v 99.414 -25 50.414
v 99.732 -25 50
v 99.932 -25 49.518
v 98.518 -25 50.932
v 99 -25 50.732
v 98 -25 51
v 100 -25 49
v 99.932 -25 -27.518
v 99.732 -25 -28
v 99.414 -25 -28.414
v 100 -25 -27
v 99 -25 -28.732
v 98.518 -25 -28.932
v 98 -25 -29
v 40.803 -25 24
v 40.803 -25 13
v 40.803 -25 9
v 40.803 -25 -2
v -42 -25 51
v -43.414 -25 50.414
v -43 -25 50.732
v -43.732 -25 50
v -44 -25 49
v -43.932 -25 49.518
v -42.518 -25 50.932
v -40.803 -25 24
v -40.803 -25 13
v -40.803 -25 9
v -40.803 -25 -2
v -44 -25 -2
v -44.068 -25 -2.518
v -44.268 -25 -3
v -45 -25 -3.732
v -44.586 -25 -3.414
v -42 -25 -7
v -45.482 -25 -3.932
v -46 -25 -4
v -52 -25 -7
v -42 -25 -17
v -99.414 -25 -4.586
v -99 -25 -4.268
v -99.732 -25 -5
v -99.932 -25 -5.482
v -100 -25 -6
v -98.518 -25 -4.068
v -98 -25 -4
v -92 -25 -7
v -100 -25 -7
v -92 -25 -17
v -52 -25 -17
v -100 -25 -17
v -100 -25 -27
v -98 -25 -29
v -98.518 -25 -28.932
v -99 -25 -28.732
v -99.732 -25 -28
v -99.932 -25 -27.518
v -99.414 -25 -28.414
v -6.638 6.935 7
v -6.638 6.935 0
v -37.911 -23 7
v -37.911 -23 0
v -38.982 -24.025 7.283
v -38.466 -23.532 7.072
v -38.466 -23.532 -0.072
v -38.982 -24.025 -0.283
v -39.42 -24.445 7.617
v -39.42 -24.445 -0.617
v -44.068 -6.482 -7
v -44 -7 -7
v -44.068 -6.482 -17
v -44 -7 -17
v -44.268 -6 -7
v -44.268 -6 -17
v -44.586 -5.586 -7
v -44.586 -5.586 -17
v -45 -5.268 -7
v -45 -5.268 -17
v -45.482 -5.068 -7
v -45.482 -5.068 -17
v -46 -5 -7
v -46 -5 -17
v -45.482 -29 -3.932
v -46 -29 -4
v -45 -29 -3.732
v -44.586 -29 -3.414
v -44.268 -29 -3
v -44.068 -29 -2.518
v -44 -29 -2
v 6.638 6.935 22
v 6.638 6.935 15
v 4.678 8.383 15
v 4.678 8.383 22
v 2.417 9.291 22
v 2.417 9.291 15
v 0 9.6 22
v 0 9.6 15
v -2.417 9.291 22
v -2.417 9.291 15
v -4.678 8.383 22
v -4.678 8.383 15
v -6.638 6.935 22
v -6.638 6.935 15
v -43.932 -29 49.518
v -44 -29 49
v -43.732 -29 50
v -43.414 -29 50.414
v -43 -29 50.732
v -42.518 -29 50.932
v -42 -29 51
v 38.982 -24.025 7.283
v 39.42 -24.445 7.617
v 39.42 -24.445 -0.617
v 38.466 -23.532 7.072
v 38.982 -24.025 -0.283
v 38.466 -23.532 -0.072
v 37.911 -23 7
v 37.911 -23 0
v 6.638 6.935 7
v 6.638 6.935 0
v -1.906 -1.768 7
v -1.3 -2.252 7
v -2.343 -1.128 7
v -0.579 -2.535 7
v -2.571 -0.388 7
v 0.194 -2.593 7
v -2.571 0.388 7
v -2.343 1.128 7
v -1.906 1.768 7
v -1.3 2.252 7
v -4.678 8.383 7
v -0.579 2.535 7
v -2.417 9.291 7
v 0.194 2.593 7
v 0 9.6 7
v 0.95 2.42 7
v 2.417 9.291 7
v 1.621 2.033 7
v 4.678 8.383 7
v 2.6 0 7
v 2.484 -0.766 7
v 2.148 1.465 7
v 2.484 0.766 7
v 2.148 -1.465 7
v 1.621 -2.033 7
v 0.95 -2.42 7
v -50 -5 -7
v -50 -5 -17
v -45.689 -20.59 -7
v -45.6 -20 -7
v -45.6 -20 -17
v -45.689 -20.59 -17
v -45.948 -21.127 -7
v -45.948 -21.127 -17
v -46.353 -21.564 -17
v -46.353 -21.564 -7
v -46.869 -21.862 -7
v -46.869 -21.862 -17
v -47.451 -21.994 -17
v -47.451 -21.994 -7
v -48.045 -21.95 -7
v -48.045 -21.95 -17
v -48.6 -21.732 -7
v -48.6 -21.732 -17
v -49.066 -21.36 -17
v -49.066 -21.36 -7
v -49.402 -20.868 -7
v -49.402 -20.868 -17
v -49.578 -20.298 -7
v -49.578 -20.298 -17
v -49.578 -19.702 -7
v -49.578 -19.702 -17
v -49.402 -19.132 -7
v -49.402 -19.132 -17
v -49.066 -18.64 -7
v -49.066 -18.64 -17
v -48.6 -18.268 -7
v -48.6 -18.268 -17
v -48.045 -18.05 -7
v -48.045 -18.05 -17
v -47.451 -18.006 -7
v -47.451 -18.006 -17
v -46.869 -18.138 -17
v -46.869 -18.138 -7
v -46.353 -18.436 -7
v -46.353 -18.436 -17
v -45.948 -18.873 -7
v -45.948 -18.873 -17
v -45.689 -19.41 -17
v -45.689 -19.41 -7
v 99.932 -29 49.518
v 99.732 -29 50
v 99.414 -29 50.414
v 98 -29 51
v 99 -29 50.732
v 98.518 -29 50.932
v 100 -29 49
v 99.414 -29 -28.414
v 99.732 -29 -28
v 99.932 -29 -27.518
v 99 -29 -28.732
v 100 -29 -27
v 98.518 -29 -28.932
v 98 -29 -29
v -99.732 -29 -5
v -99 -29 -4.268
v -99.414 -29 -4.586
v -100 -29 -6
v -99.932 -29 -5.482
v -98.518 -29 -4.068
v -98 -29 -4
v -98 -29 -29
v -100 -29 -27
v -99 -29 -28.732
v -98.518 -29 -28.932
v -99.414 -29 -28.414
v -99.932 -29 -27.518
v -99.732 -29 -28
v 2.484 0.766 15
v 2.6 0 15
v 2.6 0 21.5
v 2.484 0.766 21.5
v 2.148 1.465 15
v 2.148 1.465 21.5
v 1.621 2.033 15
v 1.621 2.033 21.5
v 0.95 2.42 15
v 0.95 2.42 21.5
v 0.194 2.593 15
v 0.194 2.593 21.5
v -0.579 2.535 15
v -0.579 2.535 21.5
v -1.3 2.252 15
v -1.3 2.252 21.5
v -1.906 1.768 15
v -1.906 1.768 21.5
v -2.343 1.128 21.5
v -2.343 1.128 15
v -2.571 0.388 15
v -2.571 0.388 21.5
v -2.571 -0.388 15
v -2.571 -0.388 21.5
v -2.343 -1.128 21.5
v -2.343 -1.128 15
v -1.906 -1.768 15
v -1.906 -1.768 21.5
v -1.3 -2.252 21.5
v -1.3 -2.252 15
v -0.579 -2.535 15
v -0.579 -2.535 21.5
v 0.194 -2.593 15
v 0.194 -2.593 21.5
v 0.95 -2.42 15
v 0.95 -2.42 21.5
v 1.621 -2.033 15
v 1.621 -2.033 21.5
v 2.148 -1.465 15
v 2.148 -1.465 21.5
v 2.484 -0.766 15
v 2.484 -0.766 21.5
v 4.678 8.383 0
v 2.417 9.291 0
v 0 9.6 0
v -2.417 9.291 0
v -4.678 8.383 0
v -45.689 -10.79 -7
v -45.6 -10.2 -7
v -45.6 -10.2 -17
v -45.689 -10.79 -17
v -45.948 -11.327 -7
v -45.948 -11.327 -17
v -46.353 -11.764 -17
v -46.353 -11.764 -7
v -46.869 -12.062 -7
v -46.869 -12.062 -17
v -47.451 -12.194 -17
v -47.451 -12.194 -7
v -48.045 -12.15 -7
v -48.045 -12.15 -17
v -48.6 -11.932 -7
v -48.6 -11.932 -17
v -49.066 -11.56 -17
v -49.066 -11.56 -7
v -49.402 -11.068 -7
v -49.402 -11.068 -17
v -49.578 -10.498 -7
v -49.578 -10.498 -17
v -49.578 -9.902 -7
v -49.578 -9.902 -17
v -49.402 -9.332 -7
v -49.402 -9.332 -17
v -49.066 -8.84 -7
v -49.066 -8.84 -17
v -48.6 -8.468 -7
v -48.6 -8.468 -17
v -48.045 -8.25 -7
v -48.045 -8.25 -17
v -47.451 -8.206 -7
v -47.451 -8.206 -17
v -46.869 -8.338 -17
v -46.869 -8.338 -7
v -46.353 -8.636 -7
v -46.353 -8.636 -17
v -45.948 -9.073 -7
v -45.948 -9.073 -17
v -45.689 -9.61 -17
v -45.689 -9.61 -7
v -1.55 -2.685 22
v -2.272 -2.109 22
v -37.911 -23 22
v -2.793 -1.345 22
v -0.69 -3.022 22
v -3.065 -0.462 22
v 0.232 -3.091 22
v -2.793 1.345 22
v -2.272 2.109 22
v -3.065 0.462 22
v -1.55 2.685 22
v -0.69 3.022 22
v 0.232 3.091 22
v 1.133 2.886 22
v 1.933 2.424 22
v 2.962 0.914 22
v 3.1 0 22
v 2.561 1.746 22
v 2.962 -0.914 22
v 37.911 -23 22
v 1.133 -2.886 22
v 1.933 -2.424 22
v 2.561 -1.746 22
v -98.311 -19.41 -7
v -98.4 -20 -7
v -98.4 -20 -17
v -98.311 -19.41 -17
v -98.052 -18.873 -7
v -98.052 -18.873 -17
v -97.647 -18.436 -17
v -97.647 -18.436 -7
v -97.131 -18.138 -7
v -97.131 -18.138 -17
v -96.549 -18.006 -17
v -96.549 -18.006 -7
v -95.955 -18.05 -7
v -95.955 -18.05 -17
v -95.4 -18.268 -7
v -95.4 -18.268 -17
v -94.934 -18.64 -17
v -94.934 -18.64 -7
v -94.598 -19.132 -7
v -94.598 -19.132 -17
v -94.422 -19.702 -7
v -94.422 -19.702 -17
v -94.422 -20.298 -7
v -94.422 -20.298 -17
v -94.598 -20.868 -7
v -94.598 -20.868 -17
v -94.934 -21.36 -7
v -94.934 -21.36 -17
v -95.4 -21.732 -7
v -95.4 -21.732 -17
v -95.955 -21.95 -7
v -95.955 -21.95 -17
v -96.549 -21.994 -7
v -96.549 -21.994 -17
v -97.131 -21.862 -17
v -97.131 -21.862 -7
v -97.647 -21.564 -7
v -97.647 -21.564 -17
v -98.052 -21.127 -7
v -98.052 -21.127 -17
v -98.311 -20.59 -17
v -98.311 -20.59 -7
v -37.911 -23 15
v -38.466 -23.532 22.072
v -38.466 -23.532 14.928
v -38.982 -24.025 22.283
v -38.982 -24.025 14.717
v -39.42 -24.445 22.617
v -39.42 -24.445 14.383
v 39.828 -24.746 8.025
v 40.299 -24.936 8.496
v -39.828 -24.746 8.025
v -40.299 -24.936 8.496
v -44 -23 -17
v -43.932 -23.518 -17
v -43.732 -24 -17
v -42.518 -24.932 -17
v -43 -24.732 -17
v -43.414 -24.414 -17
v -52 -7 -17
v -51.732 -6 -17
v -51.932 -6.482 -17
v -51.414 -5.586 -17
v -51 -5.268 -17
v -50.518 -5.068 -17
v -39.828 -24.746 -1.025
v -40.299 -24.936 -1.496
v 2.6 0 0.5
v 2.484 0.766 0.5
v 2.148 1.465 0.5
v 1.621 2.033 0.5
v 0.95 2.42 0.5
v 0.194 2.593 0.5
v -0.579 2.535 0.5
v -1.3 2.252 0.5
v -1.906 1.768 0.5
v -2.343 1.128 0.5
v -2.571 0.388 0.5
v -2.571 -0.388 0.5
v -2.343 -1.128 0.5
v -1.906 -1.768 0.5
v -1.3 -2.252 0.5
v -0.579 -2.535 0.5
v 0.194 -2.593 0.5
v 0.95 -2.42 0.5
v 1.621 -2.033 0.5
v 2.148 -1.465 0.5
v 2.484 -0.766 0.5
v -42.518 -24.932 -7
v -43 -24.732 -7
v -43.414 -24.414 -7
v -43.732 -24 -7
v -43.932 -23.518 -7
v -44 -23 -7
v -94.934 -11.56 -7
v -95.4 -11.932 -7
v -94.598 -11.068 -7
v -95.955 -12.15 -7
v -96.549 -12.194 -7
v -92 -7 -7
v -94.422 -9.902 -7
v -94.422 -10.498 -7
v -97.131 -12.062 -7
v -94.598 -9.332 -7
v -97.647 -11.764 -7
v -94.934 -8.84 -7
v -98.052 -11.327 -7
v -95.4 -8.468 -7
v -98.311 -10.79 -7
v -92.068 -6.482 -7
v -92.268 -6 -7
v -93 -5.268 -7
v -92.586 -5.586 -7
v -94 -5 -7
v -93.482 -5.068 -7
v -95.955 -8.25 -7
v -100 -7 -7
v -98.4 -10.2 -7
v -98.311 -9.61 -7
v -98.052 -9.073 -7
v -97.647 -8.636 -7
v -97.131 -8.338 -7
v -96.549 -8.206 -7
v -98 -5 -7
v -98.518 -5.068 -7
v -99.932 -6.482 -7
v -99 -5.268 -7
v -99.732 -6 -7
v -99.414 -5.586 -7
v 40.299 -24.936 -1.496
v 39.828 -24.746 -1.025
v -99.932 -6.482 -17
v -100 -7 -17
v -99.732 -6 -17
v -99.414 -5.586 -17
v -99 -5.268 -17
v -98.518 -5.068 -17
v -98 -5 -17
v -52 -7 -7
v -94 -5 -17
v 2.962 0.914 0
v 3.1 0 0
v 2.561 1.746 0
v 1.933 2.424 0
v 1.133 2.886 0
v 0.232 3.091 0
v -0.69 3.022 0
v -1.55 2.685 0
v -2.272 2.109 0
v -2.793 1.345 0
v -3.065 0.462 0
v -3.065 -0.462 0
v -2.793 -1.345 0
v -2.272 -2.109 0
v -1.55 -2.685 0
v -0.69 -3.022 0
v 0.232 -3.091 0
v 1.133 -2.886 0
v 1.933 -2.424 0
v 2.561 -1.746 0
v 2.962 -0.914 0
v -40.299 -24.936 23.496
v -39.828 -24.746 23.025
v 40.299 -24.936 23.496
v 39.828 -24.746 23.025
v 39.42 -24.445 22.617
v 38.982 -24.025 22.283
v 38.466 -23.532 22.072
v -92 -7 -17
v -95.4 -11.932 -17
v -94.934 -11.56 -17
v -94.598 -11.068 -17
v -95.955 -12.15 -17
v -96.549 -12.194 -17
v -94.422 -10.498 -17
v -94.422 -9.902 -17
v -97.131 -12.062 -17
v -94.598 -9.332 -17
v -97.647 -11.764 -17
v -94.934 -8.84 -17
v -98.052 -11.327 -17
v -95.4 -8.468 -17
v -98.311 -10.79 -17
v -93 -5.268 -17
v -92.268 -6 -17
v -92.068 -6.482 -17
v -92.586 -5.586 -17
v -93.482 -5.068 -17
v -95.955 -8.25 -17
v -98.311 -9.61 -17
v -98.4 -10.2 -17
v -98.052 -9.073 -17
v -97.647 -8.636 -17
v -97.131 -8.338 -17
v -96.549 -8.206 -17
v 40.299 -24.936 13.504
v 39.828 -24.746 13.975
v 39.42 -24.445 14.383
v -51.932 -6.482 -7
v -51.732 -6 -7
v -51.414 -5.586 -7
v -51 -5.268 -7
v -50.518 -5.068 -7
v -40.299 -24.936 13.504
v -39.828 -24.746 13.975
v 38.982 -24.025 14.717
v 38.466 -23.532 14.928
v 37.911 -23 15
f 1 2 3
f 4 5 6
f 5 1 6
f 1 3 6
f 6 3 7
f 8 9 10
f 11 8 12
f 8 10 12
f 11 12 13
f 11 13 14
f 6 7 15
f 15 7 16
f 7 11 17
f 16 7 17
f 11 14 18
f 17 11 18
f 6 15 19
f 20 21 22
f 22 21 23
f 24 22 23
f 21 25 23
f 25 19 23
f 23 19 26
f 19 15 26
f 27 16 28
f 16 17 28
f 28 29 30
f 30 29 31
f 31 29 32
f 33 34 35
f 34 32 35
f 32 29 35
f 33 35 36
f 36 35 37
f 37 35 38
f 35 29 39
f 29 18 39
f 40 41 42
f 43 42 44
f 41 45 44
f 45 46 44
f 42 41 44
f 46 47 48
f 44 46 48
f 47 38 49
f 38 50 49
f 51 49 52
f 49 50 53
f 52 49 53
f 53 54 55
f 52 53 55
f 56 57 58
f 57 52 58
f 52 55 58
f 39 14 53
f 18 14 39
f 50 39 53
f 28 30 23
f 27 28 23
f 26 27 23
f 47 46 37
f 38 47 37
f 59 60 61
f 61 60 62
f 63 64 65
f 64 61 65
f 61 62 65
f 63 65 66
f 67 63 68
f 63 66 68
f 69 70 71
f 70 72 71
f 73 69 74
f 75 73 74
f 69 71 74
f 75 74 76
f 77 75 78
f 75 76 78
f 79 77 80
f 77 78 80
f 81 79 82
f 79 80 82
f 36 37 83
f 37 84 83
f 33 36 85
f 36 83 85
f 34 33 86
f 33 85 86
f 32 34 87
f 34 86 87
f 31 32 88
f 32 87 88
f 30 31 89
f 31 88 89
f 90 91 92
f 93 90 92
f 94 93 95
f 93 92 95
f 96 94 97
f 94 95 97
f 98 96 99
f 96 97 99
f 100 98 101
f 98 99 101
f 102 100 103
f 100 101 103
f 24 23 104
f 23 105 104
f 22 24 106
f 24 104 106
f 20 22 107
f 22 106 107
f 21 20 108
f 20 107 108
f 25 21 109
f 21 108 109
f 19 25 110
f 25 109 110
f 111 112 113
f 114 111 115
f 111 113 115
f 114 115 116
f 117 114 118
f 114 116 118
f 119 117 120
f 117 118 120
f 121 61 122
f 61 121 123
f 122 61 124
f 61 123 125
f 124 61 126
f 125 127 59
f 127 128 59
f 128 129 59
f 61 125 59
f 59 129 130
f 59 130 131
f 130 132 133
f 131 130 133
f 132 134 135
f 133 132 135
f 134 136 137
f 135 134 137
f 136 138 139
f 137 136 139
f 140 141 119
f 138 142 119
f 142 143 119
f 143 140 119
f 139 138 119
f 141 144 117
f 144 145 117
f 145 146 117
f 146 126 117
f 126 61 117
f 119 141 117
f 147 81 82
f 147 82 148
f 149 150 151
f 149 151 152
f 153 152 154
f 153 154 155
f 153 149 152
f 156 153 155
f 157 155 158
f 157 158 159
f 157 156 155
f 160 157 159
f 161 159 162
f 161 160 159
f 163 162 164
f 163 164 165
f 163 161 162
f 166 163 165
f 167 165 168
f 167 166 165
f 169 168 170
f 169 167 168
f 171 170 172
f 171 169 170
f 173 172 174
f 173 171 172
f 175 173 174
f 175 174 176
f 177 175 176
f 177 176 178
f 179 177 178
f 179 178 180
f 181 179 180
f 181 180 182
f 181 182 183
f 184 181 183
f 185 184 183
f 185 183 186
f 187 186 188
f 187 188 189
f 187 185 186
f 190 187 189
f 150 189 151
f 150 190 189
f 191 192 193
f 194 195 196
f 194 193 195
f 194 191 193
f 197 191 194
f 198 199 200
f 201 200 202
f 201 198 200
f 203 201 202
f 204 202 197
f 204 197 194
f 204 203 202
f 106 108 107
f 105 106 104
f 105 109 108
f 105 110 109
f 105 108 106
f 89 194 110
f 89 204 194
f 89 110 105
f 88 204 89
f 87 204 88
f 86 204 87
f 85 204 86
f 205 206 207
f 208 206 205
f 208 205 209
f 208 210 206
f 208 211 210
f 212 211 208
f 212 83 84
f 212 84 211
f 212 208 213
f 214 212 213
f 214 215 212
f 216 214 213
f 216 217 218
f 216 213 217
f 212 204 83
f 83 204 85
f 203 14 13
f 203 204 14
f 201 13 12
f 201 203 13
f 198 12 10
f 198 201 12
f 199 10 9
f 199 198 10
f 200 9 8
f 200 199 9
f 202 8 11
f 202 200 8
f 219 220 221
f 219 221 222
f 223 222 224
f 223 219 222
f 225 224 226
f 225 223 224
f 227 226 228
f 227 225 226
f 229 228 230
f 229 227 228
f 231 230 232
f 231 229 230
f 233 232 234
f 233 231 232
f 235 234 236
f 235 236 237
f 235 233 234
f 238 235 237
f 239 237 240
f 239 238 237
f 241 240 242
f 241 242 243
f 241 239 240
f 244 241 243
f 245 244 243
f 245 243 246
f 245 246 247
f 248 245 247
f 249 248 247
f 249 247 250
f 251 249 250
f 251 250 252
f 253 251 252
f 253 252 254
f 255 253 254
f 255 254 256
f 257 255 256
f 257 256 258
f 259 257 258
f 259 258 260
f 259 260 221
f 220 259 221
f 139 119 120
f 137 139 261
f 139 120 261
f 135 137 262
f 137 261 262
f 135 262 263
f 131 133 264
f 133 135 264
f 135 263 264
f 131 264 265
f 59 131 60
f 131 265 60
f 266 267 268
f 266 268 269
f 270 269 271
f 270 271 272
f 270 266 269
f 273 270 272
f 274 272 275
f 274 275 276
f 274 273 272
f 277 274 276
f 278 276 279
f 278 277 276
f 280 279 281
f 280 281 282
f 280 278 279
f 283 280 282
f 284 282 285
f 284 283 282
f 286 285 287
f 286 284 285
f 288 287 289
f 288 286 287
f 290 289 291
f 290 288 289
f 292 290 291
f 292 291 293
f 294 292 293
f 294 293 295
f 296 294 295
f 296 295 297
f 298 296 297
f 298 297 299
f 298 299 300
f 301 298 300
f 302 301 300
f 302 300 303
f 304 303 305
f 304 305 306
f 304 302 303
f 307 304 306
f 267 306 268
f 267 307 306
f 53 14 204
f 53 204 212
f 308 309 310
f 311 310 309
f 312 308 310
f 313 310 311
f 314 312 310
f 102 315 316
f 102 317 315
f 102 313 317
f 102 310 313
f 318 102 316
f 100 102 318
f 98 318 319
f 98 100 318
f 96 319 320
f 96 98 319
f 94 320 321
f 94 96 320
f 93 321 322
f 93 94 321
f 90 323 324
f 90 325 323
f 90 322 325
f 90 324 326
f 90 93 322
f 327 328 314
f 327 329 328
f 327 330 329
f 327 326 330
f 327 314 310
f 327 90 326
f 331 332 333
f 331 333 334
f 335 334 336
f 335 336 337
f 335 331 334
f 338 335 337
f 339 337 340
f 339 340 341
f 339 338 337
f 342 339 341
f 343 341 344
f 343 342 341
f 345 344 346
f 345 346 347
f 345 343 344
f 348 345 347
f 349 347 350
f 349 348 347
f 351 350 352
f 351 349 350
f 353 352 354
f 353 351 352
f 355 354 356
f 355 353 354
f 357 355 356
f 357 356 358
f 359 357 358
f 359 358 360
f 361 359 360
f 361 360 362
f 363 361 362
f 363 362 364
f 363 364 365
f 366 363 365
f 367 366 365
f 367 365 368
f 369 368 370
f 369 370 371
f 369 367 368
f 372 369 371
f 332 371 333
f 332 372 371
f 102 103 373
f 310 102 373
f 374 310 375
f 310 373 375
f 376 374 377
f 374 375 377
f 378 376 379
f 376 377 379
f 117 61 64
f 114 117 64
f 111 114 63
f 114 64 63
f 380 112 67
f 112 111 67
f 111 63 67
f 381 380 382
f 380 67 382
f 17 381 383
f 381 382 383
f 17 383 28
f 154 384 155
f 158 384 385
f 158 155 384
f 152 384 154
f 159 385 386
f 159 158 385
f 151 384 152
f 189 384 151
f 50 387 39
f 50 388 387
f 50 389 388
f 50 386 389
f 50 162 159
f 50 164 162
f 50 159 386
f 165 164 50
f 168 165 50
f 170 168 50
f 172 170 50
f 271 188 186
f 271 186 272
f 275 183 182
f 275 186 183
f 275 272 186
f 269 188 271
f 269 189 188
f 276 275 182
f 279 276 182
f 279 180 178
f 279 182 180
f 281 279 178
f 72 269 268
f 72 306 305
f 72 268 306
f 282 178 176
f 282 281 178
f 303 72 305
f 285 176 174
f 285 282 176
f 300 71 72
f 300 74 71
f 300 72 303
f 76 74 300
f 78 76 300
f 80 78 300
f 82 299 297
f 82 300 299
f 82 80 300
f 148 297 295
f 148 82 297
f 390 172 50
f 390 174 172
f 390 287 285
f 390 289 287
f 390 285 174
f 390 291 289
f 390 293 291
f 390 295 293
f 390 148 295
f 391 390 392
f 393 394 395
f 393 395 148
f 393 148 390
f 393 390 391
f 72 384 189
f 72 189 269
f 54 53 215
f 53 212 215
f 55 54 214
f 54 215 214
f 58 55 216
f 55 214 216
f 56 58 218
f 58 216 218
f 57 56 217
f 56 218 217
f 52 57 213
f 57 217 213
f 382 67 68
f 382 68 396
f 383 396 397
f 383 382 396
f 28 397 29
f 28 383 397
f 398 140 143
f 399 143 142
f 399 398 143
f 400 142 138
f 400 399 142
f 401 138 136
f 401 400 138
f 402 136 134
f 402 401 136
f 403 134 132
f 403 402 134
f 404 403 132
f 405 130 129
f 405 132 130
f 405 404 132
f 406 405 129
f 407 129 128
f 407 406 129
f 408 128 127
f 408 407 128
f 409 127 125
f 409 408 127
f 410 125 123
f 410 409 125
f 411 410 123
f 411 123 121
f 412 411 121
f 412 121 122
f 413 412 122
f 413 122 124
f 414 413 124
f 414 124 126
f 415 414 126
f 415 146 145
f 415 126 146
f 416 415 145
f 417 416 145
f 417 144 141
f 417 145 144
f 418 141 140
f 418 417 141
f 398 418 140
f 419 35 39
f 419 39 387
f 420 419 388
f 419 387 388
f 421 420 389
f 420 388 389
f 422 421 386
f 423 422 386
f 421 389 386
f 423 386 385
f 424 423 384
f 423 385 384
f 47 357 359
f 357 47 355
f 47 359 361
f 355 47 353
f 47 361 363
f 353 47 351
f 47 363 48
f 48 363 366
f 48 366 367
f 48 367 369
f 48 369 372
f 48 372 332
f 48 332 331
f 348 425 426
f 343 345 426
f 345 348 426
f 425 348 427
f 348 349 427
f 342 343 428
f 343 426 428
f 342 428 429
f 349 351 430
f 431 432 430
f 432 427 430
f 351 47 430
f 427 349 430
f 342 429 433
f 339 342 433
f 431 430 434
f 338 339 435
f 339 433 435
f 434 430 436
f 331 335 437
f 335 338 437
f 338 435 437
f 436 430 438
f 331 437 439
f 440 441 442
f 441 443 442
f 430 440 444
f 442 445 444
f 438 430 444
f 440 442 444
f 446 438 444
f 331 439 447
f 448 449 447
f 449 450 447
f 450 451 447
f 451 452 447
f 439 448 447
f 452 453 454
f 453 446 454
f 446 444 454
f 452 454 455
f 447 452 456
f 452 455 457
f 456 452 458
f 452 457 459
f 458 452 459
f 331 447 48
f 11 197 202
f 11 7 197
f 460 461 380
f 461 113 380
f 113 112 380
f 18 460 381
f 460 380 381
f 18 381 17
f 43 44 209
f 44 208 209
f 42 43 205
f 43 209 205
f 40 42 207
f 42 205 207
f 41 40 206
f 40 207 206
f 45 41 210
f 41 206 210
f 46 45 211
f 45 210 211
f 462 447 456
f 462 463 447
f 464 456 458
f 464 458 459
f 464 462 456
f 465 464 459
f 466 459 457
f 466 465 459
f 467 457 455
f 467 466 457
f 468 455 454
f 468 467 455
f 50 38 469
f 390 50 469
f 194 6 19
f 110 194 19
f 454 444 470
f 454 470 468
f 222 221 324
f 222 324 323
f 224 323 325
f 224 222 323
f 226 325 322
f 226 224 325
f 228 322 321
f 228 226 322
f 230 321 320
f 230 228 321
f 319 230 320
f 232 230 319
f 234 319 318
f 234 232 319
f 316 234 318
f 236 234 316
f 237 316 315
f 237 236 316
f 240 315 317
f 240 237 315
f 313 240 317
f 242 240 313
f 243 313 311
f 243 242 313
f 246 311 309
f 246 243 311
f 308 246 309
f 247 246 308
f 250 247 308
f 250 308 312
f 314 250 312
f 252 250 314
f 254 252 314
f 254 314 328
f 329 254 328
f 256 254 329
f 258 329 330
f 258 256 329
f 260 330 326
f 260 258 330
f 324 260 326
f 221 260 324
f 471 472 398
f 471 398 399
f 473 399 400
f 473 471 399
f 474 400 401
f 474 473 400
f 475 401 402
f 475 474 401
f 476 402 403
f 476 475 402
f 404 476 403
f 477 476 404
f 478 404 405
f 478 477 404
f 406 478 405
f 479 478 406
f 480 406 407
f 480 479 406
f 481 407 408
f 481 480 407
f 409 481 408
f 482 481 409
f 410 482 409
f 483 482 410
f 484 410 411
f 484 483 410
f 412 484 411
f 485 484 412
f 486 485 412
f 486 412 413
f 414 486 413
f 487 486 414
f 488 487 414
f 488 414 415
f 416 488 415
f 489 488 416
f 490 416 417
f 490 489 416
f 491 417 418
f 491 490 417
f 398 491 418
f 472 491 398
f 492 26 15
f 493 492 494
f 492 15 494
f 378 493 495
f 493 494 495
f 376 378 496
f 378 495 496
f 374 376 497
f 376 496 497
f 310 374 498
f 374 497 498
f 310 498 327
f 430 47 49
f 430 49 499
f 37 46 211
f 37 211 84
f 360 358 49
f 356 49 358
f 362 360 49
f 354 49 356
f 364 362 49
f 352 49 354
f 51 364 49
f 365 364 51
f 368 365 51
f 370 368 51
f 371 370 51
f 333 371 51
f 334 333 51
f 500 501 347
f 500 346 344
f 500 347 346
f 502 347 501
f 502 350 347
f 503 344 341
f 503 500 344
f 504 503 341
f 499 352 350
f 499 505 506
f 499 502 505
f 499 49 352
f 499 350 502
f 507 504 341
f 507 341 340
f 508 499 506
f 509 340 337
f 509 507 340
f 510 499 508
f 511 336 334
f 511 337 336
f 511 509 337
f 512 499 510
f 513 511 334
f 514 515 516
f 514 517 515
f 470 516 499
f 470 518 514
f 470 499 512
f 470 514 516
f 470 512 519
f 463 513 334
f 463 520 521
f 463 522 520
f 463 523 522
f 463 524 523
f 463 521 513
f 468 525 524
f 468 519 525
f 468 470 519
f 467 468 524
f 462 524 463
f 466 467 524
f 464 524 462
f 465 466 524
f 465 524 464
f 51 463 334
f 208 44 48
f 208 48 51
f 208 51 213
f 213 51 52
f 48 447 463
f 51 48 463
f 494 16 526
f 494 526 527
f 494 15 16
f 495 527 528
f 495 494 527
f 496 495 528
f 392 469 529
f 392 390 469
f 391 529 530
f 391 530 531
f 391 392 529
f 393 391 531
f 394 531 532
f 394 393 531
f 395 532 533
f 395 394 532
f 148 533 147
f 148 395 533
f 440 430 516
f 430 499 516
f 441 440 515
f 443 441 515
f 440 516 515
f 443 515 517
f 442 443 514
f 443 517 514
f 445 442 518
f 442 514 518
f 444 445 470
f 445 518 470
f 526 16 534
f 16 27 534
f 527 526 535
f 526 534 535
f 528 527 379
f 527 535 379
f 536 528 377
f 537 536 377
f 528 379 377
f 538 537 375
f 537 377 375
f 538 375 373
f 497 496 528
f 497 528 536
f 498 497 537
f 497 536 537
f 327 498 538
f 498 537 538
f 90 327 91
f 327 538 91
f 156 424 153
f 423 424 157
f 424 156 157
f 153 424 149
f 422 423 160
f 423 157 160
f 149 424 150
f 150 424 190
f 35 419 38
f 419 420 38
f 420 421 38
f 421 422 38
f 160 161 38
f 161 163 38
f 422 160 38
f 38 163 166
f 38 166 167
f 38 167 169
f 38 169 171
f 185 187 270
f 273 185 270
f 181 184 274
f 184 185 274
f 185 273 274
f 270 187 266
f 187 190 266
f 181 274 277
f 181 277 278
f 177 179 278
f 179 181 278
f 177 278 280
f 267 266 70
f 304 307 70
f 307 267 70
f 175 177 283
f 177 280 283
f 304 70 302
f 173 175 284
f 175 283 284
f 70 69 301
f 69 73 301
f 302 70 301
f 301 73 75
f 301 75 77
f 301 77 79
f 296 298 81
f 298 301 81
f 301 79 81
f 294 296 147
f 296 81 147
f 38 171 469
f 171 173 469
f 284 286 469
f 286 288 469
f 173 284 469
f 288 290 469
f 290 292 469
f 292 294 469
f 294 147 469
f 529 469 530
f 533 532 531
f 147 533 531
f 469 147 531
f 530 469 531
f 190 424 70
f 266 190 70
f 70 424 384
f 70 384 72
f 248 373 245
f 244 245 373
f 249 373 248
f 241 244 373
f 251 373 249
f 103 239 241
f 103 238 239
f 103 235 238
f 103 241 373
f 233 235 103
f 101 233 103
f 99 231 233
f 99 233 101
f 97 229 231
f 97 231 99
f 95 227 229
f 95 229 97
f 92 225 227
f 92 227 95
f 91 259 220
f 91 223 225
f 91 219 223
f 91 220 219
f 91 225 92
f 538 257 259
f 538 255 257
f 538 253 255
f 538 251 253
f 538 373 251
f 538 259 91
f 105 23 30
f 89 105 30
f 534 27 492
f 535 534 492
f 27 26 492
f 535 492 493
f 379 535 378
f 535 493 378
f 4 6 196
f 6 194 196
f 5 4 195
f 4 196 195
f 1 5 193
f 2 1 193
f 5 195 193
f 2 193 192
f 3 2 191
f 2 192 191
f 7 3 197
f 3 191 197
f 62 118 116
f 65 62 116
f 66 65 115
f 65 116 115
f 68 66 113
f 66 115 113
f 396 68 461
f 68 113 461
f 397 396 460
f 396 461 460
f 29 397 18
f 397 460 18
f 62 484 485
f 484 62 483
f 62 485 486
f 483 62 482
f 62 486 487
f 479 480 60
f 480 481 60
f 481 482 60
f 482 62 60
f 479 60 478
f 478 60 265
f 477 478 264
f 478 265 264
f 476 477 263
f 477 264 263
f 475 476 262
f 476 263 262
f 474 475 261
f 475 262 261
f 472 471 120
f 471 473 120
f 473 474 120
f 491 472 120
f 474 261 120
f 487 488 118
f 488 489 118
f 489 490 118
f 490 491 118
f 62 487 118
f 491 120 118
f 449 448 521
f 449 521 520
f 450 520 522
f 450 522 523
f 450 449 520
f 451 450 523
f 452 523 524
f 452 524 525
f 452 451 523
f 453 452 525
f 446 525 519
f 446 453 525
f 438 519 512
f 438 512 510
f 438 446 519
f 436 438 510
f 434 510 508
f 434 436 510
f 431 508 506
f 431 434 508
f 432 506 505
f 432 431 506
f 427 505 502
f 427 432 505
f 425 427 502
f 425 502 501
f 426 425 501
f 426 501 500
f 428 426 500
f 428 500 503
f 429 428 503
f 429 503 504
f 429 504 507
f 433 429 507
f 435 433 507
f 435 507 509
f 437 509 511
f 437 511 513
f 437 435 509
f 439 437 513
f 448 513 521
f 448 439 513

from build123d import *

# Parameters (mm, degrees)
SKETCH1_R           = 2.6
BOSS_EXTRUDE1_DEPTH = 22
SKETCH2_W           = 200
SKETCH2_H           = 80
BOSS_EXTRUDE2_DEPTH = 4
SKETCH3_W           = 8
SKETCH3_H           = 35
CUT_EXTRUDE1_DEPTH  = 209.42744541
CHAMFER1_SIZE       = 0.5
BOSS_EXTRUDE3_START = -22
SKETCH4_W           = 8
SKETCH4_H           = 20
SKETCH4_R           = 2
BOSS_EXTRUDE3_DEPTH = 10
SKETCH5_W           = 56
SKETCH5_H           = 55
CUT_EXTRUDE2_DEPTH  = 7
FILLET1_R           = 2


with BuildPart() as part:
    # Sketch1 → Boss-Extrude1 (new body)
    with BuildSketch(Plane.XY):
        with BuildLine():
            Line((-6.63831163, 6.934898608), (-40, -25))
            Line((-40, -25), (40, -25))
            Line((40, -25), (6.63831163, 6.934898608))
            ThreePointArc((6.63831163, 6.934898608), (0, 9.6), (-6.63831163, 6.934898608))
        make_face()
        Circle(SKETCH1_R, mode=Mode.SUBTRACT)
    extrude(amount=BOSS_EXTRUDE1_DEPTH)

    # Sketch2 → Boss-Extrude2 (add)
    with BuildSketch(Plane(origin=(0, -25, 0), x_dir=(-1, 0, 0), z_dir=(0, -1, 0))):
        with Locations((0, -11)):
            Rectangle(SKETCH2_W, SKETCH2_H)
    extrude(amount=BOSS_EXTRUDE2_DEPTH)

    # Sketch3 → Cut-Extrude1 (cut, through all)
    with BuildSketch(Plane(origin=(100, 0, 0), x_dir=(0, 0, -1), z_dir=(1, 0, 0))):
        with Locations((-11, -7.5)):
            Rectangle(SKETCH3_W, SKETCH3_H)
    extrude(amount=-CUT_EXTRUDE1_DEPTH, mode=Mode.SUBTRACT)

    # Chamfer1
    chamfer1_edges = [part.edges().sort_by_distance(p)[0] for p in [
        (-2.6, 0, 0),
        (-2.6, 0, 22),
    ]]
    chamfer(chamfer1_edges, length=CHAMFER1_SIZE)

    # Sketch4 → Boss-Extrude3 (add)
    # profile 1 of 2: a face of its own
    with BuildSketch(Plane(origin=(0, 0, -29), x_dir=(-1, 0, 0), z_dir=(0, 0, -1)).offset(BOSS_EXTRUDE3_START)):
        with Locations((96, -15)):
            Rectangle(SKETCH4_W, SKETCH4_H)
        with Locations((96.4, -20)):
            Circle(SKETCH4_R, mode=Mode.SUBTRACT)
        with Locations((96.4, -10.2)):
            Circle(SKETCH4_R, mode=Mode.SUBTRACT)
    # profile 2 of 2: a face of its own
    with BuildSketch(Plane(origin=(0, 0, -29), x_dir=(-1, 0, 0), z_dir=(0, 0, -1)).offset(BOSS_EXTRUDE3_START)):
        with Locations((48, -15)):
            Rectangle(SKETCH4_W, SKETCH4_H)
        with Locations(Location((47.6, -20, 0), (0, 0, 180))):
            Circle(SKETCH4_R, mode=Mode.SUBTRACT)
        with Locations(Location((47.6, -10.2, 0), (0, 0, 180))):
            Circle(SKETCH4_R, mode=Mode.SUBTRACT)
    extrude(amount=BOSS_EXTRUDE3_DEPTH)

    # Sketch5 → Cut-Extrude2 (cut)
    with BuildSketch(Plane(origin=(0, -25, 0), x_dir=(1, 0, 0), z_dir=(0, 1, 0))):
        with Locations((-72, -23.5)):
            Rectangle(SKETCH5_W, SKETCH5_H)
    extrude(amount=-CUT_EXTRUDE2_DEPTH, mode=Mode.SUBTRACT)

    # Fillet1
    fillet1_edges = [part.edges().sort_by_distance(p)[0] for p in [
        (-100, -5, -12),
        (-92, -5, -12),
        (-44, -5, -12),
        (-52, -5, -12),
        (-44, -25, -12),
        (0, -25, 0),
        (0, -25, 15),
        (-40, -25, 18.5),
        (0, -25, 7),
        (-40, -25, 3.5),
        (0, -25, 22),
        (40, -25, 3.5),
        (40, -25, 18.5),
        (100, -27, -29),
        (100, -27, 51),
        (-100, -27, -29),
        (-44, -27, -4),
        (-44, -27, 51),
        (-100, -27, -4),
    ]]
    fillet(fillet1_edges, radius=FILLET1_R)


solid = part.part
